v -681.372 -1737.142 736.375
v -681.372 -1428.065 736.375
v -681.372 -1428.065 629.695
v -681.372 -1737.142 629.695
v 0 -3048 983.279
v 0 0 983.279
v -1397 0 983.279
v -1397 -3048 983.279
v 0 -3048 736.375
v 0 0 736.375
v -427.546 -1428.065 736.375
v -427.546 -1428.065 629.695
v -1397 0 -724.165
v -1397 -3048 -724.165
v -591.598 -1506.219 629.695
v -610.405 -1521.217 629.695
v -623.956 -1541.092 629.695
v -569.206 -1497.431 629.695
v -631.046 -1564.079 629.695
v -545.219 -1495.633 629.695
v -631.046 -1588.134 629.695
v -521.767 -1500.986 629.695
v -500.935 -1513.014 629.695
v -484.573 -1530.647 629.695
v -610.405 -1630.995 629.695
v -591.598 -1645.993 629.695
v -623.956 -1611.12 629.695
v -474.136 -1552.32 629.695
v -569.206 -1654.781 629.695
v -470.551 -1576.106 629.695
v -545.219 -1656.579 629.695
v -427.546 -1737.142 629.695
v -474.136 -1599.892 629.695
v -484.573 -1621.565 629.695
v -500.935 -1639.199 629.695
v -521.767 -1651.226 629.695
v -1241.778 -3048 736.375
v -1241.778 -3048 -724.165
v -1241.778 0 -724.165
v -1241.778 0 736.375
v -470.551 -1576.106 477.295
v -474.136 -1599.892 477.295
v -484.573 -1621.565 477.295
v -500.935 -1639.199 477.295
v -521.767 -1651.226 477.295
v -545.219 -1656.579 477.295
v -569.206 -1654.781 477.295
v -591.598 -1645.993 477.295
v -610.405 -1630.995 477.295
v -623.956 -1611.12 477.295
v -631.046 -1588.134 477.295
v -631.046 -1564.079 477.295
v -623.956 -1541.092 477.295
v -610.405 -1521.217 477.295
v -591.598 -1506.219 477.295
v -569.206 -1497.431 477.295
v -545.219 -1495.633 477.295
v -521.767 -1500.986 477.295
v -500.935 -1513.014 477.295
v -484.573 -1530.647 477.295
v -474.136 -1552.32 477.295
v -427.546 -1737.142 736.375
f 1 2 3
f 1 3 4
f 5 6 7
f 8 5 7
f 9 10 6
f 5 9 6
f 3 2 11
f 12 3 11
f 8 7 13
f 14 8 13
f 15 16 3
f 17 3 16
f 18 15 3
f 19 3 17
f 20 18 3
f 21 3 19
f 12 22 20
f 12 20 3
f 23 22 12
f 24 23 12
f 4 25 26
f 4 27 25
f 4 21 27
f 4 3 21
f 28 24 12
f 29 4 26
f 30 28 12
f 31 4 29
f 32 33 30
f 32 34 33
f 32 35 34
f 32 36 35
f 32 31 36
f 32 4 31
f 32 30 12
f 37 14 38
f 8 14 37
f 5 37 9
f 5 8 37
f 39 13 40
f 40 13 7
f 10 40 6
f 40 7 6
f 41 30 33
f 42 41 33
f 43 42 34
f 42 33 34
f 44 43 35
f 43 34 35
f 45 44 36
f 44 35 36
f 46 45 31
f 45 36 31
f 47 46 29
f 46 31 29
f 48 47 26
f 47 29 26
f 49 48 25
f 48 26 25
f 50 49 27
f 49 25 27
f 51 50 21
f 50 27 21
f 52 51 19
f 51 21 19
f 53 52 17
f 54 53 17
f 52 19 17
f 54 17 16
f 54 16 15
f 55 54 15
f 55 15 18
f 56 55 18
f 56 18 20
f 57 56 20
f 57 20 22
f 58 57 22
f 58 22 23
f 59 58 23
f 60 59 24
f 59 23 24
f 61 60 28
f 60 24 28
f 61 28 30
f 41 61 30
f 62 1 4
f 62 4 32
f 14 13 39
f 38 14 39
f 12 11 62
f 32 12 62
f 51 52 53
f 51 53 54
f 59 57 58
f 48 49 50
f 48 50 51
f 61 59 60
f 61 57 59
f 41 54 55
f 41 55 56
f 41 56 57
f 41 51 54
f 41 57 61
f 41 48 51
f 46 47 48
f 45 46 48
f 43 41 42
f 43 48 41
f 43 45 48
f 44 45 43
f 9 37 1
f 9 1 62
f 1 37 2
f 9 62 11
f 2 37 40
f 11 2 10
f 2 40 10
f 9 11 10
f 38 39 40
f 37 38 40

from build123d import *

# Parameters (mm, degrees)
F1_DEPTH = 3048
F2_W     = 253.825963
F2_H     = 309.076309
F3_DEPTH = 106.68
F4_R     = 80.698457
F5_DEPTH = 152.4


with BuildPart() as f1:
    # F0 (on Front) → F1 (new body)
    with BuildSketch(Plane.XZ):
        Polygon((-1397, -724.165228), (-1241.777778, -724.165228), (-1241.777778, 736.374709), (-445.169207, 736.374709), (-232.973195, 736.374709), (0, 736.374709), (0, 983.279217), (-1397, 983.279217), align=None)
    extrude(amount=F1_DEPTH)

    # F2 (on face) → F3 (join)
    with BuildSketch(Plane(origin=(0, 0, 736.374709), x_dir=(1, 0, 0), z_dir=(0, 0, -1))):
        with Locations((-554.458589, 1582.603574)):
            Rectangle(F2_W, F2_H)
    extrude(amount=F3_DEPTH)

    # F4 (on face) → F5 (join)
    with BuildSketch(Plane(origin=(0, 0, 629.694709), x_dir=(1, 0, 0), z_dir=(0, 0, -1))):
        with Locations((-551.249266, 1576.106191)):
            Circle(F4_R)
    extrude(amount=F5_DEPTH)


solid = f1.part
